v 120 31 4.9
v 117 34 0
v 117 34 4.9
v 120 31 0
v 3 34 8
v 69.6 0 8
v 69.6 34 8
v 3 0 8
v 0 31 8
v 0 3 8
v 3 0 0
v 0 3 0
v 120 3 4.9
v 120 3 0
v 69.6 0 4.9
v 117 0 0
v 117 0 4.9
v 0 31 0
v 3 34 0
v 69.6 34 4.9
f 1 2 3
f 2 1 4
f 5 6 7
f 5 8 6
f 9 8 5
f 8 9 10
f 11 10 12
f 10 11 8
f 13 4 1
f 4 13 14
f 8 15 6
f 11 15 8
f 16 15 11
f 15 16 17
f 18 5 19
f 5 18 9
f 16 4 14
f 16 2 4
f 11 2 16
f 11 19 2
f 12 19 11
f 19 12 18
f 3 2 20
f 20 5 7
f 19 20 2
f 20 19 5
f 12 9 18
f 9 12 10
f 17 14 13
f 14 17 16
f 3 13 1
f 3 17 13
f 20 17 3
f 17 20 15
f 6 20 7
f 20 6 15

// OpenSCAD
$fn = 32;

// ----------------------------------------------------------------------
// Stepped bar: endstep, 120 x 34 x 8/4.9 mm
// ----------------------------------------------------------------------

// --- parameters (mm) ---
bar_l = 120;              // bar length, X
bar_w = 34;               // bar width, Y
plate_t = 8;              // thickness of the thick zone, Z
thin_t = 4.9;             // thickness of the thin zone
corner_c = 3;             // corner chamfer of the bar
step_cut = 3.1;           // material removed from the thin zone
step_x = 69.6;            // step position from the left end
depth_1 = 3.1;            // depth of cut 1 from the top face

profile = [[3, 0], [117, 0], [120, 3], [120, 31], [117, 34], [3, 34], [0, 31], [0, 3]];  // primary outline, 8 points, counter clockwise
void_1 = [[69.6, -1], [121, -1], [121, 35], [69.6, 35]];  // thin zone beyond the step, 4 points

// --- the one profile operation ---
difference() {
  linear_extrude(height = plate_t) polygon(points = profile);
  translate([0, 0, plate_t - depth_1])
    linear_extrude(height = depth_1 + 1) polygon(points = void_1);
}
